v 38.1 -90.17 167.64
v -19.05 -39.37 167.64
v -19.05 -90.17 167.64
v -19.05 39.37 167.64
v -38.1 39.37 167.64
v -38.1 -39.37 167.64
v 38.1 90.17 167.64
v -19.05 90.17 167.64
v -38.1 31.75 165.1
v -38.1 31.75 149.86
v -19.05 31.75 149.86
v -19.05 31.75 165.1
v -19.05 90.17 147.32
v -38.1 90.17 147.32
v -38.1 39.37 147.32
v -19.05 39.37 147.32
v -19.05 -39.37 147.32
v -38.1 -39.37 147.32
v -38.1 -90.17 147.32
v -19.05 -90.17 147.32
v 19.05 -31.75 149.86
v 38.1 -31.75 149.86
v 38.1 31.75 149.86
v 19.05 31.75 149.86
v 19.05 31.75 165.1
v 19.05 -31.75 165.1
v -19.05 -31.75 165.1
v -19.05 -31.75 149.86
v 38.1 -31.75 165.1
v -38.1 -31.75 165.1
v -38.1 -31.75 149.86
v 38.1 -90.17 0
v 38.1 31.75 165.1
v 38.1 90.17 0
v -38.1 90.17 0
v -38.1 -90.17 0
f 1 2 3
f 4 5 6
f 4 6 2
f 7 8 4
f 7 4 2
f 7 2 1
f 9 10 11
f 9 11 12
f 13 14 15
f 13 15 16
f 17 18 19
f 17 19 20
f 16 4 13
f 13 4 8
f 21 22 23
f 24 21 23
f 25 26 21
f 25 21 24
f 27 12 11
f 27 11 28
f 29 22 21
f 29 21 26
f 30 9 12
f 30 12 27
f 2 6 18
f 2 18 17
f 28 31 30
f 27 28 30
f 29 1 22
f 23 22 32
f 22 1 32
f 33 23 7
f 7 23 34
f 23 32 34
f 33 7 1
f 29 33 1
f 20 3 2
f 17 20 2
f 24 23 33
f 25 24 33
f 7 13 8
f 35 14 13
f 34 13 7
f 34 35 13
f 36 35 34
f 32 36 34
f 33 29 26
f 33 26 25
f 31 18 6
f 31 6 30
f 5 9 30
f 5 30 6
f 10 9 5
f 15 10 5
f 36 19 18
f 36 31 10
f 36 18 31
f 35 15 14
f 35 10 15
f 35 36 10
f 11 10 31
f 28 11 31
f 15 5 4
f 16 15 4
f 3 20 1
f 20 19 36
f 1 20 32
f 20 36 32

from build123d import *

# Parameters (mm, degrees)
F0_W     = 76.2
F0_H     = 180.34
F1_DEPTH = 167.64
F2_W     = 19.05
F2_H     = 50.8
F3_DEPTH = 20.32
F4_W     = 63.5
F4_H     = 15.24
F5_DEPTH = 19.05
F6_W     = 63.5
F6_H     = 15.24
F7_DEPTH = 19.05


with BuildPart() as f1:
    # F0 (on Top) → F1 (new body)
    with BuildSketch(Plane.XY):
        Rectangle(F0_W, F0_H)
    extrude(amount=F1_DEPTH)

    # F2 (on face) → F3 (cut)
    with BuildSketch(Plane.XY.offset(167.64)):
        with Locations((-28.575, -64.77)):
            Rectangle(F2_W, F2_H)
        with Locations((-28.575, 64.77)):
            Rectangle(F2_W, F2_H)
    extrude(amount=-F3_DEPTH, mode=Mode.SUBTRACT)

    # F4 (on face) → F5 (cut)
    with BuildSketch(Plane(origin=(-38.1, 0, 0), x_dir=(0, -1, 0), z_dir=(-1, 0, 0))):
        with Locations((0, 157.48)):
            Rectangle(F4_W, F4_H)
    extrude(amount=-F5_DEPTH, mode=Mode.SUBTRACT)

    # F6 (on face) → F7 (cut)
    with BuildSketch(Plane.YZ.offset(38.1)):
        with Locations((0, 157.48)):
            Rectangle(F6_W, F6_H)
    extrude(amount=-F7_DEPTH, mode=Mode.SUBTRACT)


solid = f1.part
